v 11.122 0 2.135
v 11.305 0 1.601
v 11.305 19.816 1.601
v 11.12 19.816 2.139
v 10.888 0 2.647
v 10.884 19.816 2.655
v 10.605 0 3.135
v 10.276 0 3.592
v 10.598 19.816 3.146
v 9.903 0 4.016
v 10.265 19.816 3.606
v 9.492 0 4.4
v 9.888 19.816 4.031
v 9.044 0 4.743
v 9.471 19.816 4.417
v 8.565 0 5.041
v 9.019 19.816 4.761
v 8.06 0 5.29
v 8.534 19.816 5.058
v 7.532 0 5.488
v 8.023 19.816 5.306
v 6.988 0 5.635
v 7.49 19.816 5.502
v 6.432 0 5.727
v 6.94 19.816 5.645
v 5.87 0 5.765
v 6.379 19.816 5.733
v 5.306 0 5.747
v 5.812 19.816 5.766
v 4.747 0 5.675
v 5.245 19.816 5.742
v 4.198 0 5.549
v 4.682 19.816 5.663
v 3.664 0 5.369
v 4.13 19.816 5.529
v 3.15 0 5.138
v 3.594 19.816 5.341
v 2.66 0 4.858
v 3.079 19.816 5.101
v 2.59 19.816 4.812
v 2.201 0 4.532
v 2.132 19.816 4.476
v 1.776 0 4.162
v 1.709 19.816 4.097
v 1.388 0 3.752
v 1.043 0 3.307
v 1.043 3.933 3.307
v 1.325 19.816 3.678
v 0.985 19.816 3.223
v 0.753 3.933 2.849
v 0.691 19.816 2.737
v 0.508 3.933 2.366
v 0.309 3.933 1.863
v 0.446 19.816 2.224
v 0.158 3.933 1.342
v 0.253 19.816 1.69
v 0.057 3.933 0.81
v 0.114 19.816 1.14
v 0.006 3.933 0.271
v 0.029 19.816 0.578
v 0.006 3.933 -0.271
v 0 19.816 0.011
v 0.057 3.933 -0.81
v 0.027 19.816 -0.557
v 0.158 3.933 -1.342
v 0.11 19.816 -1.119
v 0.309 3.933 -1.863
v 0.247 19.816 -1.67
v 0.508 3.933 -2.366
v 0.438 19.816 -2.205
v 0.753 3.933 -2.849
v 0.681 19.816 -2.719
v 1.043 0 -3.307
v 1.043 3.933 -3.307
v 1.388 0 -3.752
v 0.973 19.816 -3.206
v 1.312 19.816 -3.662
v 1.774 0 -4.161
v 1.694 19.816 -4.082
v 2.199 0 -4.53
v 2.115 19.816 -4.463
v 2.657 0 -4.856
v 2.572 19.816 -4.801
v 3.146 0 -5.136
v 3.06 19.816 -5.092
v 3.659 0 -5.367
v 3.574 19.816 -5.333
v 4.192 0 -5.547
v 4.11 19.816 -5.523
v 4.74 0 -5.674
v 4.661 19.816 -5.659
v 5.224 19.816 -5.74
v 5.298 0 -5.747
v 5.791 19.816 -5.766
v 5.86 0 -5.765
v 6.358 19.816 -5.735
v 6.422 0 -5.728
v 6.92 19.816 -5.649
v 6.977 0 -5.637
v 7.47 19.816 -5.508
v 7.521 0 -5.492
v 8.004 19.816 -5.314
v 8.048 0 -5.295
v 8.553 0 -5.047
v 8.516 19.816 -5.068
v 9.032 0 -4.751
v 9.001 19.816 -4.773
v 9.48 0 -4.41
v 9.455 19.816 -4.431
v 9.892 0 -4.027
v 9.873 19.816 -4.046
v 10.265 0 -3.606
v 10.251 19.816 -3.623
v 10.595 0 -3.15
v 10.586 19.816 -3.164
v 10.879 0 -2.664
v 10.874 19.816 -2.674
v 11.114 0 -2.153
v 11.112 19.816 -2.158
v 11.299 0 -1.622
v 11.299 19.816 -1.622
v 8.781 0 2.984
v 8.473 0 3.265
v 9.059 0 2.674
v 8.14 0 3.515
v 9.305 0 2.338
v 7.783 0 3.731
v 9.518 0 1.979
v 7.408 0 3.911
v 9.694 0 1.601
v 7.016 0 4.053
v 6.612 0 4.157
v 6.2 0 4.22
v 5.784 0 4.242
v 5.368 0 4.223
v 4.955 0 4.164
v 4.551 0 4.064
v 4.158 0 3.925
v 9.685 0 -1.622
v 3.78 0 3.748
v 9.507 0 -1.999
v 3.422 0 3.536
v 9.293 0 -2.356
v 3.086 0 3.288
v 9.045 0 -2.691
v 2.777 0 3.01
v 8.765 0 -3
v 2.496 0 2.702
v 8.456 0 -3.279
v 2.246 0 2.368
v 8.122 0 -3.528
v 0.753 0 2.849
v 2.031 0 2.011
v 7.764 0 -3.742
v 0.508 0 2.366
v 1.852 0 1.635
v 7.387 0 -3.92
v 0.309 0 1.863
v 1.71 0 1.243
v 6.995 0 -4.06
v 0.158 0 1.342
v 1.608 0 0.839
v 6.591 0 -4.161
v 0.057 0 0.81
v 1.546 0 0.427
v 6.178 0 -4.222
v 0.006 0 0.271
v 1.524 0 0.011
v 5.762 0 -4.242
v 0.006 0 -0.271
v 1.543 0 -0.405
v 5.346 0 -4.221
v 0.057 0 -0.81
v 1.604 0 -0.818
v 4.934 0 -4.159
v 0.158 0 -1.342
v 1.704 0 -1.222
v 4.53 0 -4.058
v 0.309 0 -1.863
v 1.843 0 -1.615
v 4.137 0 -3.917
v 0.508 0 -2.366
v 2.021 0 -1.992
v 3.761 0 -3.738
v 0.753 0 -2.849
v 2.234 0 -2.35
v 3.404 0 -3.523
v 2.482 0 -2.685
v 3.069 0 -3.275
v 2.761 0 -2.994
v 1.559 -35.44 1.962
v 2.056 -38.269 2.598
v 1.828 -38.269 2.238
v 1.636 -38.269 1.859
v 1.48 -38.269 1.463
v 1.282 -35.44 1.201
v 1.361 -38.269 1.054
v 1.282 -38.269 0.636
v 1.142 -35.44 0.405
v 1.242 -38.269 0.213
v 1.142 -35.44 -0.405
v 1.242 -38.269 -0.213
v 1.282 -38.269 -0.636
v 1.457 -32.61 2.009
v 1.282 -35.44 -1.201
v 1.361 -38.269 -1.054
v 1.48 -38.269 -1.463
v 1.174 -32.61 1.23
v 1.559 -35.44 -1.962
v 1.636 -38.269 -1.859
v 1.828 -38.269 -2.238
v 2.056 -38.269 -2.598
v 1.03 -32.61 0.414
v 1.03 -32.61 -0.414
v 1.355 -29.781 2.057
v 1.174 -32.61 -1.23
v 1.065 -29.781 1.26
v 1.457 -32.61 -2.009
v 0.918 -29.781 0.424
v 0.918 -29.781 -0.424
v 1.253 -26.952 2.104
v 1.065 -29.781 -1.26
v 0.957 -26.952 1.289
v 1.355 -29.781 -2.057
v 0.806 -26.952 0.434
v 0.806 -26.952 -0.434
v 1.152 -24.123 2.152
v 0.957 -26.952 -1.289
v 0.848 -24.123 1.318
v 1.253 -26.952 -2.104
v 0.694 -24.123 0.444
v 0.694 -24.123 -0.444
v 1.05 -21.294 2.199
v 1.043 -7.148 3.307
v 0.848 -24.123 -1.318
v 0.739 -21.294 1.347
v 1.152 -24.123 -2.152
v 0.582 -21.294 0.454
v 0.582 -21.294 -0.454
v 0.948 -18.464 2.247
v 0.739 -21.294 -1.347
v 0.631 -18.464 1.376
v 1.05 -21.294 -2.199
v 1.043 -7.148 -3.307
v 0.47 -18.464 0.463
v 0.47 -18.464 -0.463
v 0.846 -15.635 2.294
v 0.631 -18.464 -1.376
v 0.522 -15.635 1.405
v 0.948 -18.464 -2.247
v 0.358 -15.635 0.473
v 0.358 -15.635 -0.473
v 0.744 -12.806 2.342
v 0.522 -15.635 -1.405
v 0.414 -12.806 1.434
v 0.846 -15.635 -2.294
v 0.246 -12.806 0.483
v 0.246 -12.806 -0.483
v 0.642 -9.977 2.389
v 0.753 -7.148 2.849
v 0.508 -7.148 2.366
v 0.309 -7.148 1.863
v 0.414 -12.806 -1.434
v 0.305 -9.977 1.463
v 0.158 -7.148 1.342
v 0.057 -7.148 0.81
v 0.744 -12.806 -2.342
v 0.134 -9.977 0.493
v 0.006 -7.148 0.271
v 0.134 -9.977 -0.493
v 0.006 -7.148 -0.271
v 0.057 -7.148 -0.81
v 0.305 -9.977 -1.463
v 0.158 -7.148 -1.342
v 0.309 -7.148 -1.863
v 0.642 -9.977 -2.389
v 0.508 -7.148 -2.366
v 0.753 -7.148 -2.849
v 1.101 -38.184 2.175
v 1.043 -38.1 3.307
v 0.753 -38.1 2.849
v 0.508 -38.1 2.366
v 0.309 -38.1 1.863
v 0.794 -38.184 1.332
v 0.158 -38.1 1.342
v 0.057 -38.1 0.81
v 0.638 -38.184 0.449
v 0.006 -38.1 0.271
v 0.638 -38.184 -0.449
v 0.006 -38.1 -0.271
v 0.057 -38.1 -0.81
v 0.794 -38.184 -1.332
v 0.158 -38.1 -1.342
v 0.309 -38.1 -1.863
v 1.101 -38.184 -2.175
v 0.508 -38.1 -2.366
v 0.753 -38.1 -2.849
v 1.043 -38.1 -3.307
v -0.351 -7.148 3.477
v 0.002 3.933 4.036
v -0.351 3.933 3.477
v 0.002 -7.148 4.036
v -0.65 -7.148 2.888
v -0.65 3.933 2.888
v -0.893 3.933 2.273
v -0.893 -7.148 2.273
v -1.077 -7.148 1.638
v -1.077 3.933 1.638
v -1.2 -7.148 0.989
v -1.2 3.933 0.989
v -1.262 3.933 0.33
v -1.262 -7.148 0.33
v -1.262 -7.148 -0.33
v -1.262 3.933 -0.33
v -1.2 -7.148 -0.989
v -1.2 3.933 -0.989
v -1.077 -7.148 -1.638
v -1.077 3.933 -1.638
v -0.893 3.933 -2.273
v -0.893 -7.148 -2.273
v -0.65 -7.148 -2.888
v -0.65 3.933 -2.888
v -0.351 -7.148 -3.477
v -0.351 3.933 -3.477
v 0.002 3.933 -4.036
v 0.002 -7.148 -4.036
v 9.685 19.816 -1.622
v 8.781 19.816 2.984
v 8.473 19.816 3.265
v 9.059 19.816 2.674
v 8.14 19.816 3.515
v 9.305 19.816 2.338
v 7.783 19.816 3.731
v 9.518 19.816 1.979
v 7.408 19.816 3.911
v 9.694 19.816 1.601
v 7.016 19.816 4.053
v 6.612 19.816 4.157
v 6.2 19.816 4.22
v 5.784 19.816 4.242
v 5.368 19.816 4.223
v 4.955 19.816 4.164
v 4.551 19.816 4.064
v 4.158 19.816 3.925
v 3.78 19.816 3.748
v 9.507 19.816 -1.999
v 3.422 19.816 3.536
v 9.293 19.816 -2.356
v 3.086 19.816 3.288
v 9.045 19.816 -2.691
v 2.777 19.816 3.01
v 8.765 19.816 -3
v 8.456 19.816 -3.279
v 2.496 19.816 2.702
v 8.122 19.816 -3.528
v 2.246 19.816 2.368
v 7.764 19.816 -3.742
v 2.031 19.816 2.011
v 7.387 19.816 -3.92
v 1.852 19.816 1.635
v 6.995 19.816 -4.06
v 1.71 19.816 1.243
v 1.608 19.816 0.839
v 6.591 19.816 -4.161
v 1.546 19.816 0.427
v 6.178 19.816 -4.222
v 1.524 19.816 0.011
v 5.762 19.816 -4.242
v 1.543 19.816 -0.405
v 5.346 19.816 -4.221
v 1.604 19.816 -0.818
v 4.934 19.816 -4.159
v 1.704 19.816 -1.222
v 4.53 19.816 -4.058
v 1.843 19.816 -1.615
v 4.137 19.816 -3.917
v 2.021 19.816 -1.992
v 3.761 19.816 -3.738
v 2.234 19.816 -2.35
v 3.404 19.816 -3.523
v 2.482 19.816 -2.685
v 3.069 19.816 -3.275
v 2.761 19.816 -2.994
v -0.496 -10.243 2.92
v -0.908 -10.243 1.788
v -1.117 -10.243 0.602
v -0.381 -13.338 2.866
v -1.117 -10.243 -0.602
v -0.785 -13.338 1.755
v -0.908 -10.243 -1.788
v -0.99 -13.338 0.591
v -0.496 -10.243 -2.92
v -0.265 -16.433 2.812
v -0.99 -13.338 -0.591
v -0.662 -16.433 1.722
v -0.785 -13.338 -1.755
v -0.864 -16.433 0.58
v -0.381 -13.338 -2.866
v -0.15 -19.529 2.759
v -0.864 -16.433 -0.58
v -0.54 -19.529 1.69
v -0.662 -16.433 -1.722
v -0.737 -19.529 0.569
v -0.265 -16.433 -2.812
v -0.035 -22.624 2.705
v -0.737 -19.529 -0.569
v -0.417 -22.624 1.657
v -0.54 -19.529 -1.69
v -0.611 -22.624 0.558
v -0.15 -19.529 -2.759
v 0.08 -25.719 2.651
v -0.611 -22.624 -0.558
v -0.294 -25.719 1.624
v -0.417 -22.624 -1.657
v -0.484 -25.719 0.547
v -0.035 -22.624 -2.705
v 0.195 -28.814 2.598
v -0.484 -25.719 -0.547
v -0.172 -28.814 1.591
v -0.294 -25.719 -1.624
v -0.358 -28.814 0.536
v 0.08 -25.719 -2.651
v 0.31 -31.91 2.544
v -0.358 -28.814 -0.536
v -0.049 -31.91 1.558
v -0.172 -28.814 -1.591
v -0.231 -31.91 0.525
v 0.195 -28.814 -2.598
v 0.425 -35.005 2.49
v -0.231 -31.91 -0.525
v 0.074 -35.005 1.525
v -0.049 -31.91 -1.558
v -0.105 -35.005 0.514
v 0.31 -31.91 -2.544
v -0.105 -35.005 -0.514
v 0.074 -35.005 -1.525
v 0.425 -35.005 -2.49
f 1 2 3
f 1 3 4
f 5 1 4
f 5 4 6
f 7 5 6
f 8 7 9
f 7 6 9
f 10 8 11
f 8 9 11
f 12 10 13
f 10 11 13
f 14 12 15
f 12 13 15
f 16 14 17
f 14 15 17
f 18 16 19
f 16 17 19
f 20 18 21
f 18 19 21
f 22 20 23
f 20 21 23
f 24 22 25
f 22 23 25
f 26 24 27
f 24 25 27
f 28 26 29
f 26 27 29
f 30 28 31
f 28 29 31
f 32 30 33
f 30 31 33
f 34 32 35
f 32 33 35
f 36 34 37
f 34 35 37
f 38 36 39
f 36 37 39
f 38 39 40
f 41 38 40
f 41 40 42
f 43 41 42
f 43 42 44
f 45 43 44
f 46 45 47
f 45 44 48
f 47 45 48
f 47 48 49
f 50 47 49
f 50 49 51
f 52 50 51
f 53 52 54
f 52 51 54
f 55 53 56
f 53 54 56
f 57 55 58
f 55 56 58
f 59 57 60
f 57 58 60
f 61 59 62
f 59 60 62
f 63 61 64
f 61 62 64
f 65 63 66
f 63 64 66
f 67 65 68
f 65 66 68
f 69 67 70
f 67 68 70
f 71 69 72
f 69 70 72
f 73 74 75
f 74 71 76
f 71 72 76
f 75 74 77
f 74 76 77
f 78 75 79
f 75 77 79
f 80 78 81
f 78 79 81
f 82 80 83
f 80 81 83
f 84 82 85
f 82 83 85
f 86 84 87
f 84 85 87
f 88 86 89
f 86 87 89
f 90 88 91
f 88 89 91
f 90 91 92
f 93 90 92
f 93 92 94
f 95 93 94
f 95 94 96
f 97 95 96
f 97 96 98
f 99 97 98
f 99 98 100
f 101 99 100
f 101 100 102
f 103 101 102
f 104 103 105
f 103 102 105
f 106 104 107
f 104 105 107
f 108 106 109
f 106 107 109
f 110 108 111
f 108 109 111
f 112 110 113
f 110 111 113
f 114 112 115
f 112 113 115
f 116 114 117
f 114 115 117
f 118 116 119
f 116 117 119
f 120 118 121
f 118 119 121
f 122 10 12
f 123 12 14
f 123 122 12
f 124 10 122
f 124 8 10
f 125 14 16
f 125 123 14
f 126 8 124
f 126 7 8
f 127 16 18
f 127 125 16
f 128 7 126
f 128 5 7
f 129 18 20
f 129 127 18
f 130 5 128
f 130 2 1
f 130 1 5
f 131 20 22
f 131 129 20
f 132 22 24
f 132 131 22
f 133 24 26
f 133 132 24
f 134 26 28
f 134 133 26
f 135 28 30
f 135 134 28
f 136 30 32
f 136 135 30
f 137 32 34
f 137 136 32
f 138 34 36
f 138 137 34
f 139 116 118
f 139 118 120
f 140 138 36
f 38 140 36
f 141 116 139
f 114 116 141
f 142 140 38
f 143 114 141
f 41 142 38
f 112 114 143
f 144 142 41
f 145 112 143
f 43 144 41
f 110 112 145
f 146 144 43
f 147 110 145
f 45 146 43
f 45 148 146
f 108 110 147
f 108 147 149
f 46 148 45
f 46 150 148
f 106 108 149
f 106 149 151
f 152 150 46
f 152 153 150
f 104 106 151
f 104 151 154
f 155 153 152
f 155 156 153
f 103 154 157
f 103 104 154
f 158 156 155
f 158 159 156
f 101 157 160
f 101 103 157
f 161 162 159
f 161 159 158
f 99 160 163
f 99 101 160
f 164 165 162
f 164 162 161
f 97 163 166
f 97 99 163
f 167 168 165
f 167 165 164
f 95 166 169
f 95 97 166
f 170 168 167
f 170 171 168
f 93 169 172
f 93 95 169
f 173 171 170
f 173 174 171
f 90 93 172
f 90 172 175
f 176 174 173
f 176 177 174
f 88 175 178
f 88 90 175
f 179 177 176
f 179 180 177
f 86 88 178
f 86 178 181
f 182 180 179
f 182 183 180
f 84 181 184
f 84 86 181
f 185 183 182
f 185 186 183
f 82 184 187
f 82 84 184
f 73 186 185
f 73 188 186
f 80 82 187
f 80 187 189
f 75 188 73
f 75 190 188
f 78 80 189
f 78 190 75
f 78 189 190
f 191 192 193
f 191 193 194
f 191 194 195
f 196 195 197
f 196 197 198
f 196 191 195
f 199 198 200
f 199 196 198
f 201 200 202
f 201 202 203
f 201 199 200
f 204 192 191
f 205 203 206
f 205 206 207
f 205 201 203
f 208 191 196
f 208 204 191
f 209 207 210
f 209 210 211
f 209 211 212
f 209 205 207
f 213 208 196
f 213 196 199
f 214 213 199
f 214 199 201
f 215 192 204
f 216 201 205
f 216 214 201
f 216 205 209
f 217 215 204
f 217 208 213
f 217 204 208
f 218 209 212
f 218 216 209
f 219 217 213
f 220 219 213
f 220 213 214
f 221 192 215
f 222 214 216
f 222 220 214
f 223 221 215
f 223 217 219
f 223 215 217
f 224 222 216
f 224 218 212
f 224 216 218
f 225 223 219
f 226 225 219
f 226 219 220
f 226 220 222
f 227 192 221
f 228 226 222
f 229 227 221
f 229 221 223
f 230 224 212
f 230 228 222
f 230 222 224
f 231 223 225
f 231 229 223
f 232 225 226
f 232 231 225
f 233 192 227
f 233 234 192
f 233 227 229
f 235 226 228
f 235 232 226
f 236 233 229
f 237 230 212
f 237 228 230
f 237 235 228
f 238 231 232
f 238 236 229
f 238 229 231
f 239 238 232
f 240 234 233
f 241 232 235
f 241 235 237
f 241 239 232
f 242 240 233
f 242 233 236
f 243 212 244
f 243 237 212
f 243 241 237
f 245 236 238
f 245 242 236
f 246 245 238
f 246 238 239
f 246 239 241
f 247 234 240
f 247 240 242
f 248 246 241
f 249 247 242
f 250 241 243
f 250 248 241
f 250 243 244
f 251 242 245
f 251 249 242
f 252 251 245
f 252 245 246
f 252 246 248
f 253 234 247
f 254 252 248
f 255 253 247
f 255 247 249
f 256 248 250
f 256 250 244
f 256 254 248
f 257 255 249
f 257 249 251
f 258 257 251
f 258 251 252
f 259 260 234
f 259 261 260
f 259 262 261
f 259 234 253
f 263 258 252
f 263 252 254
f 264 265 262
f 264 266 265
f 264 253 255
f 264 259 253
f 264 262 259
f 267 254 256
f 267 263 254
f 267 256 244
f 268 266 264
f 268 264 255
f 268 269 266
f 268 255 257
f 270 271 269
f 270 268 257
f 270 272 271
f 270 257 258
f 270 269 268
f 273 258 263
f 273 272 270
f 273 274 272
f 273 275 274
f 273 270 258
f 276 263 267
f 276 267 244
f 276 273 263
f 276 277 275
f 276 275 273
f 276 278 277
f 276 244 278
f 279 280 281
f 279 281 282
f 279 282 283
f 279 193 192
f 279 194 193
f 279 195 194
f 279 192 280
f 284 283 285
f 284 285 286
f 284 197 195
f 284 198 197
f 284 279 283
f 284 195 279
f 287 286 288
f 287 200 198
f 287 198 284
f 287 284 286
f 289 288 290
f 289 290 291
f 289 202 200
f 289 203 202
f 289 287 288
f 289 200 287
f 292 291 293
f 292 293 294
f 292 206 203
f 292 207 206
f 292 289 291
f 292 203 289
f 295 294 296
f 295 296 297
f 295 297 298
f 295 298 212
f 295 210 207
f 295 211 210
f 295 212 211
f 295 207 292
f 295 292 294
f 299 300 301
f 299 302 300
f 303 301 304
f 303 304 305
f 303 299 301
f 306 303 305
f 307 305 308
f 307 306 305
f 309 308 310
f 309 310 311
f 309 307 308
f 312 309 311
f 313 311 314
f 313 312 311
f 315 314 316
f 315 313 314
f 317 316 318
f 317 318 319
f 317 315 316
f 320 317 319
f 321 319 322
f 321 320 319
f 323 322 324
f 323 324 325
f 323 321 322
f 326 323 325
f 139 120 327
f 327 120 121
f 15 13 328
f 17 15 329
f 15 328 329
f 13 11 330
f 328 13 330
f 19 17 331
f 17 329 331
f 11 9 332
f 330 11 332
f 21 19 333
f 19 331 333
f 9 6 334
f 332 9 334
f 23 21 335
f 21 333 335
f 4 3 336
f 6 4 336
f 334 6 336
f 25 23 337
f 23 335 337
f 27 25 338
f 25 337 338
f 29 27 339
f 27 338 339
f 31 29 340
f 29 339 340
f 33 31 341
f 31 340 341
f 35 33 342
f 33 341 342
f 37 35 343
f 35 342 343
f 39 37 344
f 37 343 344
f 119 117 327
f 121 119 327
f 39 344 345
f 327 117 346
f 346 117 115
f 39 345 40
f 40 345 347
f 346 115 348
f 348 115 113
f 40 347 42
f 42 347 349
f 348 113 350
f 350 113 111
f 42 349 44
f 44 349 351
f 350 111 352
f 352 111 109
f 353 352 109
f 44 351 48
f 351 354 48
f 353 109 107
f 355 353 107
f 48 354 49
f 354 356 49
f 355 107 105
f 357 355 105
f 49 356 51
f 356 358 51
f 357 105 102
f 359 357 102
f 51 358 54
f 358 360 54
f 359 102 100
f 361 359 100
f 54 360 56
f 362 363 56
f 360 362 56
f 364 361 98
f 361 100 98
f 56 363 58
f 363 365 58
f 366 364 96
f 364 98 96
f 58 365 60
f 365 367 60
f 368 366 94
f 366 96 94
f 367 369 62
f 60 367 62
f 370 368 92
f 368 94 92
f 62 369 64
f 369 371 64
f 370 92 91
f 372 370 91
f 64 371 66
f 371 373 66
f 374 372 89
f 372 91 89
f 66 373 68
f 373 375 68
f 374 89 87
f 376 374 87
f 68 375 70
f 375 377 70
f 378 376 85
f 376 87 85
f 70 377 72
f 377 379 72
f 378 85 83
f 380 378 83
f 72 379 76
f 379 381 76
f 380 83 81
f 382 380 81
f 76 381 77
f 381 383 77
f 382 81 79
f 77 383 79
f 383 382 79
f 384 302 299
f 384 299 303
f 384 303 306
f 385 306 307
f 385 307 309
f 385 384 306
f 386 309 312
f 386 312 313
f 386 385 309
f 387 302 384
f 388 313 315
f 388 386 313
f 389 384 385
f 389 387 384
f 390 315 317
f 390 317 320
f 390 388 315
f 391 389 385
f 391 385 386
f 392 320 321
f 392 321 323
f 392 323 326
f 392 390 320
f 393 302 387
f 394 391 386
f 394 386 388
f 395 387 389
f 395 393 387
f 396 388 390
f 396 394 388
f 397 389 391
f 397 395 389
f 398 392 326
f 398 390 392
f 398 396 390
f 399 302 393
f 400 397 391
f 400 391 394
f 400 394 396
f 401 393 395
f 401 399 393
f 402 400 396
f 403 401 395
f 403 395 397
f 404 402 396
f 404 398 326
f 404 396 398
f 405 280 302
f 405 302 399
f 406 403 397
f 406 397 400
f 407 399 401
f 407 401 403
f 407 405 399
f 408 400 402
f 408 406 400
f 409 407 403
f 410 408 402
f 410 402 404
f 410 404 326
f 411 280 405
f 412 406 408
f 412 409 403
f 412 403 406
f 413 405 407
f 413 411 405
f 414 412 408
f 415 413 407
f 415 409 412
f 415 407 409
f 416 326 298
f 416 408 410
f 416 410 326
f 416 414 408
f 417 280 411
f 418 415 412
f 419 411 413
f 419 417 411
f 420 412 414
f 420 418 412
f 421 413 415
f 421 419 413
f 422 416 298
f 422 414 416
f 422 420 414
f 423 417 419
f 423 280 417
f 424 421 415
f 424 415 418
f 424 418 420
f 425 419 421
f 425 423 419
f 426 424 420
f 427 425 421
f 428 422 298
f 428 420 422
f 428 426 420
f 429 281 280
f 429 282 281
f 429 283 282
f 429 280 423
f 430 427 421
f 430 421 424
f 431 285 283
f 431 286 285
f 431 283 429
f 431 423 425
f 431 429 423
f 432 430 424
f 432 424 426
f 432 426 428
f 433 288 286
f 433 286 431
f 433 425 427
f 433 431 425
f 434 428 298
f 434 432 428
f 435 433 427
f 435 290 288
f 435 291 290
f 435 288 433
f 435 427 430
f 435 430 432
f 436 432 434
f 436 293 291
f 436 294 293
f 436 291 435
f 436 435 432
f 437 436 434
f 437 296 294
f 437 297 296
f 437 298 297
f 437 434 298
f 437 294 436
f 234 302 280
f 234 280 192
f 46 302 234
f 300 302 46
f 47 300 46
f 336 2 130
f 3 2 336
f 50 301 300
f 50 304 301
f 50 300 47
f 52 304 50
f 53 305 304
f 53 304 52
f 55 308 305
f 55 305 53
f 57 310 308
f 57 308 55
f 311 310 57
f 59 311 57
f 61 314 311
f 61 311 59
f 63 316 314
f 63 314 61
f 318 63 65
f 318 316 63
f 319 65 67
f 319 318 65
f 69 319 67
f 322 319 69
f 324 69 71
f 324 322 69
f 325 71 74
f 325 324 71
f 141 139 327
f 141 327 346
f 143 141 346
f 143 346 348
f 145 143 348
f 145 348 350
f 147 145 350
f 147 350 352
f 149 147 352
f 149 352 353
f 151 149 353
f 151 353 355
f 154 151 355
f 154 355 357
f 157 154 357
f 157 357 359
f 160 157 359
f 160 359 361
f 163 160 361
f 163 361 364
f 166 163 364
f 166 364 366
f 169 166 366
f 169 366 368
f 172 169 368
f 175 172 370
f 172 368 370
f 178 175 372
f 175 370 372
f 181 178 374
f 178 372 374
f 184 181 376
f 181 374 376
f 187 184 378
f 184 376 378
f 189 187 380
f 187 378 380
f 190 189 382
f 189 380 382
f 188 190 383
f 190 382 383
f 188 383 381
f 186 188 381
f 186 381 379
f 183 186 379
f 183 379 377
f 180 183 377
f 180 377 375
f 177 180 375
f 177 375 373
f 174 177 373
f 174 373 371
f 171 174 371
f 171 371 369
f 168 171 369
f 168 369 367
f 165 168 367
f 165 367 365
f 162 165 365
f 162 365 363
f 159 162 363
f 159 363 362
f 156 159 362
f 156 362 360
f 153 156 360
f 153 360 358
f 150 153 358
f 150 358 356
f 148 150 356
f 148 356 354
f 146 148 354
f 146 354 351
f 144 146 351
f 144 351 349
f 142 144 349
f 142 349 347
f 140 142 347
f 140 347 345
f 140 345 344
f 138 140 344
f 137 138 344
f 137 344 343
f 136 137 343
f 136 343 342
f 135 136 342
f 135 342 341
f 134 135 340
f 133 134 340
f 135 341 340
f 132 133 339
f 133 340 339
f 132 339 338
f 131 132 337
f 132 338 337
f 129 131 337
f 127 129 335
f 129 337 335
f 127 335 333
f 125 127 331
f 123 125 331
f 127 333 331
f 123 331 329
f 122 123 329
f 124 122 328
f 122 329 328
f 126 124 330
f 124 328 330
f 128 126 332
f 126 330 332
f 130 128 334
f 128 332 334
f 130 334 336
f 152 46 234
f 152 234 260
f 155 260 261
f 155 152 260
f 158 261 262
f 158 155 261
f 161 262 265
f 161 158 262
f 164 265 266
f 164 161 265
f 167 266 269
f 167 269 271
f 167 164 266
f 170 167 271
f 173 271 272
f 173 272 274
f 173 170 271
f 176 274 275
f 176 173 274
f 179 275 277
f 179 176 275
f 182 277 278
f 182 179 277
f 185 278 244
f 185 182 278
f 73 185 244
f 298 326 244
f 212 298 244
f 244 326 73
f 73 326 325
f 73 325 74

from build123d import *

# Parameters (mm, degrees)
F0_W          = 5.7658
F0_H          = 19.8156631229
F2_R          = 4.2418
F3_DEPTH      = 19.8166631229
F5_ANGLE_BACK = 35
F5_ANGLE      = 70
F7_W          = 19.842395559
F7_H          = 3.2231725054
F8_DEPTH      = 2.54


# Not quite as in the source:
# - a feature names something its author has since deleted; it is built from what else it names


with BuildPart() as f1:
    # F0 (on Top) → F1 (revolve)
    with BuildSketch(Plane.XY):
        with Locations((2.8829, 9.9078315614)):
            Rectangle(F0_W, F0_H)
    revolve(axis=Axis((5.7658, 9.9078315614, 0), (0, -1, 0)))

    # F2 (on face) → F3 (cut, through all)
    with BuildSketch(Plane(origin=(0, 19.8156631229, 0), x_dir=(-1, 0, 0), z_dir=(0, 1, 0))):
        with Locations((-5.7658, 0)):
            Circle(F2_R)
    extrude(amount=-F3_DEPTH, mode=Mode.SUBTRACT)

    # F4 (on Top) → F5 (revolve)
    with BuildSketch(Plane.XY, mode=Mode.PRIVATE) as f5_sk:
        Polygon((0, -7.1477591426), (0, 0), (0, 3.933498799), (-1.27, 3.933498799), (-1.27, 0), (-1.27, -7.1477591426), (0, -38.1), (1.2367536547, -38.268789649), align=None)
    revolve(f5_sk.sketch.rotate(Axis((5.7658, 11.3838200413, 0), (0, -1, 0)), -F5_ANGLE_BACK), axis=Axis((5.7658, 11.3838200413, 0), (0, -1, 0)), revolution_arc=F5_ANGLE)

    # F7 (on offset) → F8 (cut)
    with BuildSketch(Plane.YZ.offset(11.7856)):
        with Locations((9.9211977795, -0.010144955)):
            Rectangle(F7_W, F7_H)
    extrude(amount=-F8_DEPTH, mode=Mode.SUBTRACT)


solid = f1.part
